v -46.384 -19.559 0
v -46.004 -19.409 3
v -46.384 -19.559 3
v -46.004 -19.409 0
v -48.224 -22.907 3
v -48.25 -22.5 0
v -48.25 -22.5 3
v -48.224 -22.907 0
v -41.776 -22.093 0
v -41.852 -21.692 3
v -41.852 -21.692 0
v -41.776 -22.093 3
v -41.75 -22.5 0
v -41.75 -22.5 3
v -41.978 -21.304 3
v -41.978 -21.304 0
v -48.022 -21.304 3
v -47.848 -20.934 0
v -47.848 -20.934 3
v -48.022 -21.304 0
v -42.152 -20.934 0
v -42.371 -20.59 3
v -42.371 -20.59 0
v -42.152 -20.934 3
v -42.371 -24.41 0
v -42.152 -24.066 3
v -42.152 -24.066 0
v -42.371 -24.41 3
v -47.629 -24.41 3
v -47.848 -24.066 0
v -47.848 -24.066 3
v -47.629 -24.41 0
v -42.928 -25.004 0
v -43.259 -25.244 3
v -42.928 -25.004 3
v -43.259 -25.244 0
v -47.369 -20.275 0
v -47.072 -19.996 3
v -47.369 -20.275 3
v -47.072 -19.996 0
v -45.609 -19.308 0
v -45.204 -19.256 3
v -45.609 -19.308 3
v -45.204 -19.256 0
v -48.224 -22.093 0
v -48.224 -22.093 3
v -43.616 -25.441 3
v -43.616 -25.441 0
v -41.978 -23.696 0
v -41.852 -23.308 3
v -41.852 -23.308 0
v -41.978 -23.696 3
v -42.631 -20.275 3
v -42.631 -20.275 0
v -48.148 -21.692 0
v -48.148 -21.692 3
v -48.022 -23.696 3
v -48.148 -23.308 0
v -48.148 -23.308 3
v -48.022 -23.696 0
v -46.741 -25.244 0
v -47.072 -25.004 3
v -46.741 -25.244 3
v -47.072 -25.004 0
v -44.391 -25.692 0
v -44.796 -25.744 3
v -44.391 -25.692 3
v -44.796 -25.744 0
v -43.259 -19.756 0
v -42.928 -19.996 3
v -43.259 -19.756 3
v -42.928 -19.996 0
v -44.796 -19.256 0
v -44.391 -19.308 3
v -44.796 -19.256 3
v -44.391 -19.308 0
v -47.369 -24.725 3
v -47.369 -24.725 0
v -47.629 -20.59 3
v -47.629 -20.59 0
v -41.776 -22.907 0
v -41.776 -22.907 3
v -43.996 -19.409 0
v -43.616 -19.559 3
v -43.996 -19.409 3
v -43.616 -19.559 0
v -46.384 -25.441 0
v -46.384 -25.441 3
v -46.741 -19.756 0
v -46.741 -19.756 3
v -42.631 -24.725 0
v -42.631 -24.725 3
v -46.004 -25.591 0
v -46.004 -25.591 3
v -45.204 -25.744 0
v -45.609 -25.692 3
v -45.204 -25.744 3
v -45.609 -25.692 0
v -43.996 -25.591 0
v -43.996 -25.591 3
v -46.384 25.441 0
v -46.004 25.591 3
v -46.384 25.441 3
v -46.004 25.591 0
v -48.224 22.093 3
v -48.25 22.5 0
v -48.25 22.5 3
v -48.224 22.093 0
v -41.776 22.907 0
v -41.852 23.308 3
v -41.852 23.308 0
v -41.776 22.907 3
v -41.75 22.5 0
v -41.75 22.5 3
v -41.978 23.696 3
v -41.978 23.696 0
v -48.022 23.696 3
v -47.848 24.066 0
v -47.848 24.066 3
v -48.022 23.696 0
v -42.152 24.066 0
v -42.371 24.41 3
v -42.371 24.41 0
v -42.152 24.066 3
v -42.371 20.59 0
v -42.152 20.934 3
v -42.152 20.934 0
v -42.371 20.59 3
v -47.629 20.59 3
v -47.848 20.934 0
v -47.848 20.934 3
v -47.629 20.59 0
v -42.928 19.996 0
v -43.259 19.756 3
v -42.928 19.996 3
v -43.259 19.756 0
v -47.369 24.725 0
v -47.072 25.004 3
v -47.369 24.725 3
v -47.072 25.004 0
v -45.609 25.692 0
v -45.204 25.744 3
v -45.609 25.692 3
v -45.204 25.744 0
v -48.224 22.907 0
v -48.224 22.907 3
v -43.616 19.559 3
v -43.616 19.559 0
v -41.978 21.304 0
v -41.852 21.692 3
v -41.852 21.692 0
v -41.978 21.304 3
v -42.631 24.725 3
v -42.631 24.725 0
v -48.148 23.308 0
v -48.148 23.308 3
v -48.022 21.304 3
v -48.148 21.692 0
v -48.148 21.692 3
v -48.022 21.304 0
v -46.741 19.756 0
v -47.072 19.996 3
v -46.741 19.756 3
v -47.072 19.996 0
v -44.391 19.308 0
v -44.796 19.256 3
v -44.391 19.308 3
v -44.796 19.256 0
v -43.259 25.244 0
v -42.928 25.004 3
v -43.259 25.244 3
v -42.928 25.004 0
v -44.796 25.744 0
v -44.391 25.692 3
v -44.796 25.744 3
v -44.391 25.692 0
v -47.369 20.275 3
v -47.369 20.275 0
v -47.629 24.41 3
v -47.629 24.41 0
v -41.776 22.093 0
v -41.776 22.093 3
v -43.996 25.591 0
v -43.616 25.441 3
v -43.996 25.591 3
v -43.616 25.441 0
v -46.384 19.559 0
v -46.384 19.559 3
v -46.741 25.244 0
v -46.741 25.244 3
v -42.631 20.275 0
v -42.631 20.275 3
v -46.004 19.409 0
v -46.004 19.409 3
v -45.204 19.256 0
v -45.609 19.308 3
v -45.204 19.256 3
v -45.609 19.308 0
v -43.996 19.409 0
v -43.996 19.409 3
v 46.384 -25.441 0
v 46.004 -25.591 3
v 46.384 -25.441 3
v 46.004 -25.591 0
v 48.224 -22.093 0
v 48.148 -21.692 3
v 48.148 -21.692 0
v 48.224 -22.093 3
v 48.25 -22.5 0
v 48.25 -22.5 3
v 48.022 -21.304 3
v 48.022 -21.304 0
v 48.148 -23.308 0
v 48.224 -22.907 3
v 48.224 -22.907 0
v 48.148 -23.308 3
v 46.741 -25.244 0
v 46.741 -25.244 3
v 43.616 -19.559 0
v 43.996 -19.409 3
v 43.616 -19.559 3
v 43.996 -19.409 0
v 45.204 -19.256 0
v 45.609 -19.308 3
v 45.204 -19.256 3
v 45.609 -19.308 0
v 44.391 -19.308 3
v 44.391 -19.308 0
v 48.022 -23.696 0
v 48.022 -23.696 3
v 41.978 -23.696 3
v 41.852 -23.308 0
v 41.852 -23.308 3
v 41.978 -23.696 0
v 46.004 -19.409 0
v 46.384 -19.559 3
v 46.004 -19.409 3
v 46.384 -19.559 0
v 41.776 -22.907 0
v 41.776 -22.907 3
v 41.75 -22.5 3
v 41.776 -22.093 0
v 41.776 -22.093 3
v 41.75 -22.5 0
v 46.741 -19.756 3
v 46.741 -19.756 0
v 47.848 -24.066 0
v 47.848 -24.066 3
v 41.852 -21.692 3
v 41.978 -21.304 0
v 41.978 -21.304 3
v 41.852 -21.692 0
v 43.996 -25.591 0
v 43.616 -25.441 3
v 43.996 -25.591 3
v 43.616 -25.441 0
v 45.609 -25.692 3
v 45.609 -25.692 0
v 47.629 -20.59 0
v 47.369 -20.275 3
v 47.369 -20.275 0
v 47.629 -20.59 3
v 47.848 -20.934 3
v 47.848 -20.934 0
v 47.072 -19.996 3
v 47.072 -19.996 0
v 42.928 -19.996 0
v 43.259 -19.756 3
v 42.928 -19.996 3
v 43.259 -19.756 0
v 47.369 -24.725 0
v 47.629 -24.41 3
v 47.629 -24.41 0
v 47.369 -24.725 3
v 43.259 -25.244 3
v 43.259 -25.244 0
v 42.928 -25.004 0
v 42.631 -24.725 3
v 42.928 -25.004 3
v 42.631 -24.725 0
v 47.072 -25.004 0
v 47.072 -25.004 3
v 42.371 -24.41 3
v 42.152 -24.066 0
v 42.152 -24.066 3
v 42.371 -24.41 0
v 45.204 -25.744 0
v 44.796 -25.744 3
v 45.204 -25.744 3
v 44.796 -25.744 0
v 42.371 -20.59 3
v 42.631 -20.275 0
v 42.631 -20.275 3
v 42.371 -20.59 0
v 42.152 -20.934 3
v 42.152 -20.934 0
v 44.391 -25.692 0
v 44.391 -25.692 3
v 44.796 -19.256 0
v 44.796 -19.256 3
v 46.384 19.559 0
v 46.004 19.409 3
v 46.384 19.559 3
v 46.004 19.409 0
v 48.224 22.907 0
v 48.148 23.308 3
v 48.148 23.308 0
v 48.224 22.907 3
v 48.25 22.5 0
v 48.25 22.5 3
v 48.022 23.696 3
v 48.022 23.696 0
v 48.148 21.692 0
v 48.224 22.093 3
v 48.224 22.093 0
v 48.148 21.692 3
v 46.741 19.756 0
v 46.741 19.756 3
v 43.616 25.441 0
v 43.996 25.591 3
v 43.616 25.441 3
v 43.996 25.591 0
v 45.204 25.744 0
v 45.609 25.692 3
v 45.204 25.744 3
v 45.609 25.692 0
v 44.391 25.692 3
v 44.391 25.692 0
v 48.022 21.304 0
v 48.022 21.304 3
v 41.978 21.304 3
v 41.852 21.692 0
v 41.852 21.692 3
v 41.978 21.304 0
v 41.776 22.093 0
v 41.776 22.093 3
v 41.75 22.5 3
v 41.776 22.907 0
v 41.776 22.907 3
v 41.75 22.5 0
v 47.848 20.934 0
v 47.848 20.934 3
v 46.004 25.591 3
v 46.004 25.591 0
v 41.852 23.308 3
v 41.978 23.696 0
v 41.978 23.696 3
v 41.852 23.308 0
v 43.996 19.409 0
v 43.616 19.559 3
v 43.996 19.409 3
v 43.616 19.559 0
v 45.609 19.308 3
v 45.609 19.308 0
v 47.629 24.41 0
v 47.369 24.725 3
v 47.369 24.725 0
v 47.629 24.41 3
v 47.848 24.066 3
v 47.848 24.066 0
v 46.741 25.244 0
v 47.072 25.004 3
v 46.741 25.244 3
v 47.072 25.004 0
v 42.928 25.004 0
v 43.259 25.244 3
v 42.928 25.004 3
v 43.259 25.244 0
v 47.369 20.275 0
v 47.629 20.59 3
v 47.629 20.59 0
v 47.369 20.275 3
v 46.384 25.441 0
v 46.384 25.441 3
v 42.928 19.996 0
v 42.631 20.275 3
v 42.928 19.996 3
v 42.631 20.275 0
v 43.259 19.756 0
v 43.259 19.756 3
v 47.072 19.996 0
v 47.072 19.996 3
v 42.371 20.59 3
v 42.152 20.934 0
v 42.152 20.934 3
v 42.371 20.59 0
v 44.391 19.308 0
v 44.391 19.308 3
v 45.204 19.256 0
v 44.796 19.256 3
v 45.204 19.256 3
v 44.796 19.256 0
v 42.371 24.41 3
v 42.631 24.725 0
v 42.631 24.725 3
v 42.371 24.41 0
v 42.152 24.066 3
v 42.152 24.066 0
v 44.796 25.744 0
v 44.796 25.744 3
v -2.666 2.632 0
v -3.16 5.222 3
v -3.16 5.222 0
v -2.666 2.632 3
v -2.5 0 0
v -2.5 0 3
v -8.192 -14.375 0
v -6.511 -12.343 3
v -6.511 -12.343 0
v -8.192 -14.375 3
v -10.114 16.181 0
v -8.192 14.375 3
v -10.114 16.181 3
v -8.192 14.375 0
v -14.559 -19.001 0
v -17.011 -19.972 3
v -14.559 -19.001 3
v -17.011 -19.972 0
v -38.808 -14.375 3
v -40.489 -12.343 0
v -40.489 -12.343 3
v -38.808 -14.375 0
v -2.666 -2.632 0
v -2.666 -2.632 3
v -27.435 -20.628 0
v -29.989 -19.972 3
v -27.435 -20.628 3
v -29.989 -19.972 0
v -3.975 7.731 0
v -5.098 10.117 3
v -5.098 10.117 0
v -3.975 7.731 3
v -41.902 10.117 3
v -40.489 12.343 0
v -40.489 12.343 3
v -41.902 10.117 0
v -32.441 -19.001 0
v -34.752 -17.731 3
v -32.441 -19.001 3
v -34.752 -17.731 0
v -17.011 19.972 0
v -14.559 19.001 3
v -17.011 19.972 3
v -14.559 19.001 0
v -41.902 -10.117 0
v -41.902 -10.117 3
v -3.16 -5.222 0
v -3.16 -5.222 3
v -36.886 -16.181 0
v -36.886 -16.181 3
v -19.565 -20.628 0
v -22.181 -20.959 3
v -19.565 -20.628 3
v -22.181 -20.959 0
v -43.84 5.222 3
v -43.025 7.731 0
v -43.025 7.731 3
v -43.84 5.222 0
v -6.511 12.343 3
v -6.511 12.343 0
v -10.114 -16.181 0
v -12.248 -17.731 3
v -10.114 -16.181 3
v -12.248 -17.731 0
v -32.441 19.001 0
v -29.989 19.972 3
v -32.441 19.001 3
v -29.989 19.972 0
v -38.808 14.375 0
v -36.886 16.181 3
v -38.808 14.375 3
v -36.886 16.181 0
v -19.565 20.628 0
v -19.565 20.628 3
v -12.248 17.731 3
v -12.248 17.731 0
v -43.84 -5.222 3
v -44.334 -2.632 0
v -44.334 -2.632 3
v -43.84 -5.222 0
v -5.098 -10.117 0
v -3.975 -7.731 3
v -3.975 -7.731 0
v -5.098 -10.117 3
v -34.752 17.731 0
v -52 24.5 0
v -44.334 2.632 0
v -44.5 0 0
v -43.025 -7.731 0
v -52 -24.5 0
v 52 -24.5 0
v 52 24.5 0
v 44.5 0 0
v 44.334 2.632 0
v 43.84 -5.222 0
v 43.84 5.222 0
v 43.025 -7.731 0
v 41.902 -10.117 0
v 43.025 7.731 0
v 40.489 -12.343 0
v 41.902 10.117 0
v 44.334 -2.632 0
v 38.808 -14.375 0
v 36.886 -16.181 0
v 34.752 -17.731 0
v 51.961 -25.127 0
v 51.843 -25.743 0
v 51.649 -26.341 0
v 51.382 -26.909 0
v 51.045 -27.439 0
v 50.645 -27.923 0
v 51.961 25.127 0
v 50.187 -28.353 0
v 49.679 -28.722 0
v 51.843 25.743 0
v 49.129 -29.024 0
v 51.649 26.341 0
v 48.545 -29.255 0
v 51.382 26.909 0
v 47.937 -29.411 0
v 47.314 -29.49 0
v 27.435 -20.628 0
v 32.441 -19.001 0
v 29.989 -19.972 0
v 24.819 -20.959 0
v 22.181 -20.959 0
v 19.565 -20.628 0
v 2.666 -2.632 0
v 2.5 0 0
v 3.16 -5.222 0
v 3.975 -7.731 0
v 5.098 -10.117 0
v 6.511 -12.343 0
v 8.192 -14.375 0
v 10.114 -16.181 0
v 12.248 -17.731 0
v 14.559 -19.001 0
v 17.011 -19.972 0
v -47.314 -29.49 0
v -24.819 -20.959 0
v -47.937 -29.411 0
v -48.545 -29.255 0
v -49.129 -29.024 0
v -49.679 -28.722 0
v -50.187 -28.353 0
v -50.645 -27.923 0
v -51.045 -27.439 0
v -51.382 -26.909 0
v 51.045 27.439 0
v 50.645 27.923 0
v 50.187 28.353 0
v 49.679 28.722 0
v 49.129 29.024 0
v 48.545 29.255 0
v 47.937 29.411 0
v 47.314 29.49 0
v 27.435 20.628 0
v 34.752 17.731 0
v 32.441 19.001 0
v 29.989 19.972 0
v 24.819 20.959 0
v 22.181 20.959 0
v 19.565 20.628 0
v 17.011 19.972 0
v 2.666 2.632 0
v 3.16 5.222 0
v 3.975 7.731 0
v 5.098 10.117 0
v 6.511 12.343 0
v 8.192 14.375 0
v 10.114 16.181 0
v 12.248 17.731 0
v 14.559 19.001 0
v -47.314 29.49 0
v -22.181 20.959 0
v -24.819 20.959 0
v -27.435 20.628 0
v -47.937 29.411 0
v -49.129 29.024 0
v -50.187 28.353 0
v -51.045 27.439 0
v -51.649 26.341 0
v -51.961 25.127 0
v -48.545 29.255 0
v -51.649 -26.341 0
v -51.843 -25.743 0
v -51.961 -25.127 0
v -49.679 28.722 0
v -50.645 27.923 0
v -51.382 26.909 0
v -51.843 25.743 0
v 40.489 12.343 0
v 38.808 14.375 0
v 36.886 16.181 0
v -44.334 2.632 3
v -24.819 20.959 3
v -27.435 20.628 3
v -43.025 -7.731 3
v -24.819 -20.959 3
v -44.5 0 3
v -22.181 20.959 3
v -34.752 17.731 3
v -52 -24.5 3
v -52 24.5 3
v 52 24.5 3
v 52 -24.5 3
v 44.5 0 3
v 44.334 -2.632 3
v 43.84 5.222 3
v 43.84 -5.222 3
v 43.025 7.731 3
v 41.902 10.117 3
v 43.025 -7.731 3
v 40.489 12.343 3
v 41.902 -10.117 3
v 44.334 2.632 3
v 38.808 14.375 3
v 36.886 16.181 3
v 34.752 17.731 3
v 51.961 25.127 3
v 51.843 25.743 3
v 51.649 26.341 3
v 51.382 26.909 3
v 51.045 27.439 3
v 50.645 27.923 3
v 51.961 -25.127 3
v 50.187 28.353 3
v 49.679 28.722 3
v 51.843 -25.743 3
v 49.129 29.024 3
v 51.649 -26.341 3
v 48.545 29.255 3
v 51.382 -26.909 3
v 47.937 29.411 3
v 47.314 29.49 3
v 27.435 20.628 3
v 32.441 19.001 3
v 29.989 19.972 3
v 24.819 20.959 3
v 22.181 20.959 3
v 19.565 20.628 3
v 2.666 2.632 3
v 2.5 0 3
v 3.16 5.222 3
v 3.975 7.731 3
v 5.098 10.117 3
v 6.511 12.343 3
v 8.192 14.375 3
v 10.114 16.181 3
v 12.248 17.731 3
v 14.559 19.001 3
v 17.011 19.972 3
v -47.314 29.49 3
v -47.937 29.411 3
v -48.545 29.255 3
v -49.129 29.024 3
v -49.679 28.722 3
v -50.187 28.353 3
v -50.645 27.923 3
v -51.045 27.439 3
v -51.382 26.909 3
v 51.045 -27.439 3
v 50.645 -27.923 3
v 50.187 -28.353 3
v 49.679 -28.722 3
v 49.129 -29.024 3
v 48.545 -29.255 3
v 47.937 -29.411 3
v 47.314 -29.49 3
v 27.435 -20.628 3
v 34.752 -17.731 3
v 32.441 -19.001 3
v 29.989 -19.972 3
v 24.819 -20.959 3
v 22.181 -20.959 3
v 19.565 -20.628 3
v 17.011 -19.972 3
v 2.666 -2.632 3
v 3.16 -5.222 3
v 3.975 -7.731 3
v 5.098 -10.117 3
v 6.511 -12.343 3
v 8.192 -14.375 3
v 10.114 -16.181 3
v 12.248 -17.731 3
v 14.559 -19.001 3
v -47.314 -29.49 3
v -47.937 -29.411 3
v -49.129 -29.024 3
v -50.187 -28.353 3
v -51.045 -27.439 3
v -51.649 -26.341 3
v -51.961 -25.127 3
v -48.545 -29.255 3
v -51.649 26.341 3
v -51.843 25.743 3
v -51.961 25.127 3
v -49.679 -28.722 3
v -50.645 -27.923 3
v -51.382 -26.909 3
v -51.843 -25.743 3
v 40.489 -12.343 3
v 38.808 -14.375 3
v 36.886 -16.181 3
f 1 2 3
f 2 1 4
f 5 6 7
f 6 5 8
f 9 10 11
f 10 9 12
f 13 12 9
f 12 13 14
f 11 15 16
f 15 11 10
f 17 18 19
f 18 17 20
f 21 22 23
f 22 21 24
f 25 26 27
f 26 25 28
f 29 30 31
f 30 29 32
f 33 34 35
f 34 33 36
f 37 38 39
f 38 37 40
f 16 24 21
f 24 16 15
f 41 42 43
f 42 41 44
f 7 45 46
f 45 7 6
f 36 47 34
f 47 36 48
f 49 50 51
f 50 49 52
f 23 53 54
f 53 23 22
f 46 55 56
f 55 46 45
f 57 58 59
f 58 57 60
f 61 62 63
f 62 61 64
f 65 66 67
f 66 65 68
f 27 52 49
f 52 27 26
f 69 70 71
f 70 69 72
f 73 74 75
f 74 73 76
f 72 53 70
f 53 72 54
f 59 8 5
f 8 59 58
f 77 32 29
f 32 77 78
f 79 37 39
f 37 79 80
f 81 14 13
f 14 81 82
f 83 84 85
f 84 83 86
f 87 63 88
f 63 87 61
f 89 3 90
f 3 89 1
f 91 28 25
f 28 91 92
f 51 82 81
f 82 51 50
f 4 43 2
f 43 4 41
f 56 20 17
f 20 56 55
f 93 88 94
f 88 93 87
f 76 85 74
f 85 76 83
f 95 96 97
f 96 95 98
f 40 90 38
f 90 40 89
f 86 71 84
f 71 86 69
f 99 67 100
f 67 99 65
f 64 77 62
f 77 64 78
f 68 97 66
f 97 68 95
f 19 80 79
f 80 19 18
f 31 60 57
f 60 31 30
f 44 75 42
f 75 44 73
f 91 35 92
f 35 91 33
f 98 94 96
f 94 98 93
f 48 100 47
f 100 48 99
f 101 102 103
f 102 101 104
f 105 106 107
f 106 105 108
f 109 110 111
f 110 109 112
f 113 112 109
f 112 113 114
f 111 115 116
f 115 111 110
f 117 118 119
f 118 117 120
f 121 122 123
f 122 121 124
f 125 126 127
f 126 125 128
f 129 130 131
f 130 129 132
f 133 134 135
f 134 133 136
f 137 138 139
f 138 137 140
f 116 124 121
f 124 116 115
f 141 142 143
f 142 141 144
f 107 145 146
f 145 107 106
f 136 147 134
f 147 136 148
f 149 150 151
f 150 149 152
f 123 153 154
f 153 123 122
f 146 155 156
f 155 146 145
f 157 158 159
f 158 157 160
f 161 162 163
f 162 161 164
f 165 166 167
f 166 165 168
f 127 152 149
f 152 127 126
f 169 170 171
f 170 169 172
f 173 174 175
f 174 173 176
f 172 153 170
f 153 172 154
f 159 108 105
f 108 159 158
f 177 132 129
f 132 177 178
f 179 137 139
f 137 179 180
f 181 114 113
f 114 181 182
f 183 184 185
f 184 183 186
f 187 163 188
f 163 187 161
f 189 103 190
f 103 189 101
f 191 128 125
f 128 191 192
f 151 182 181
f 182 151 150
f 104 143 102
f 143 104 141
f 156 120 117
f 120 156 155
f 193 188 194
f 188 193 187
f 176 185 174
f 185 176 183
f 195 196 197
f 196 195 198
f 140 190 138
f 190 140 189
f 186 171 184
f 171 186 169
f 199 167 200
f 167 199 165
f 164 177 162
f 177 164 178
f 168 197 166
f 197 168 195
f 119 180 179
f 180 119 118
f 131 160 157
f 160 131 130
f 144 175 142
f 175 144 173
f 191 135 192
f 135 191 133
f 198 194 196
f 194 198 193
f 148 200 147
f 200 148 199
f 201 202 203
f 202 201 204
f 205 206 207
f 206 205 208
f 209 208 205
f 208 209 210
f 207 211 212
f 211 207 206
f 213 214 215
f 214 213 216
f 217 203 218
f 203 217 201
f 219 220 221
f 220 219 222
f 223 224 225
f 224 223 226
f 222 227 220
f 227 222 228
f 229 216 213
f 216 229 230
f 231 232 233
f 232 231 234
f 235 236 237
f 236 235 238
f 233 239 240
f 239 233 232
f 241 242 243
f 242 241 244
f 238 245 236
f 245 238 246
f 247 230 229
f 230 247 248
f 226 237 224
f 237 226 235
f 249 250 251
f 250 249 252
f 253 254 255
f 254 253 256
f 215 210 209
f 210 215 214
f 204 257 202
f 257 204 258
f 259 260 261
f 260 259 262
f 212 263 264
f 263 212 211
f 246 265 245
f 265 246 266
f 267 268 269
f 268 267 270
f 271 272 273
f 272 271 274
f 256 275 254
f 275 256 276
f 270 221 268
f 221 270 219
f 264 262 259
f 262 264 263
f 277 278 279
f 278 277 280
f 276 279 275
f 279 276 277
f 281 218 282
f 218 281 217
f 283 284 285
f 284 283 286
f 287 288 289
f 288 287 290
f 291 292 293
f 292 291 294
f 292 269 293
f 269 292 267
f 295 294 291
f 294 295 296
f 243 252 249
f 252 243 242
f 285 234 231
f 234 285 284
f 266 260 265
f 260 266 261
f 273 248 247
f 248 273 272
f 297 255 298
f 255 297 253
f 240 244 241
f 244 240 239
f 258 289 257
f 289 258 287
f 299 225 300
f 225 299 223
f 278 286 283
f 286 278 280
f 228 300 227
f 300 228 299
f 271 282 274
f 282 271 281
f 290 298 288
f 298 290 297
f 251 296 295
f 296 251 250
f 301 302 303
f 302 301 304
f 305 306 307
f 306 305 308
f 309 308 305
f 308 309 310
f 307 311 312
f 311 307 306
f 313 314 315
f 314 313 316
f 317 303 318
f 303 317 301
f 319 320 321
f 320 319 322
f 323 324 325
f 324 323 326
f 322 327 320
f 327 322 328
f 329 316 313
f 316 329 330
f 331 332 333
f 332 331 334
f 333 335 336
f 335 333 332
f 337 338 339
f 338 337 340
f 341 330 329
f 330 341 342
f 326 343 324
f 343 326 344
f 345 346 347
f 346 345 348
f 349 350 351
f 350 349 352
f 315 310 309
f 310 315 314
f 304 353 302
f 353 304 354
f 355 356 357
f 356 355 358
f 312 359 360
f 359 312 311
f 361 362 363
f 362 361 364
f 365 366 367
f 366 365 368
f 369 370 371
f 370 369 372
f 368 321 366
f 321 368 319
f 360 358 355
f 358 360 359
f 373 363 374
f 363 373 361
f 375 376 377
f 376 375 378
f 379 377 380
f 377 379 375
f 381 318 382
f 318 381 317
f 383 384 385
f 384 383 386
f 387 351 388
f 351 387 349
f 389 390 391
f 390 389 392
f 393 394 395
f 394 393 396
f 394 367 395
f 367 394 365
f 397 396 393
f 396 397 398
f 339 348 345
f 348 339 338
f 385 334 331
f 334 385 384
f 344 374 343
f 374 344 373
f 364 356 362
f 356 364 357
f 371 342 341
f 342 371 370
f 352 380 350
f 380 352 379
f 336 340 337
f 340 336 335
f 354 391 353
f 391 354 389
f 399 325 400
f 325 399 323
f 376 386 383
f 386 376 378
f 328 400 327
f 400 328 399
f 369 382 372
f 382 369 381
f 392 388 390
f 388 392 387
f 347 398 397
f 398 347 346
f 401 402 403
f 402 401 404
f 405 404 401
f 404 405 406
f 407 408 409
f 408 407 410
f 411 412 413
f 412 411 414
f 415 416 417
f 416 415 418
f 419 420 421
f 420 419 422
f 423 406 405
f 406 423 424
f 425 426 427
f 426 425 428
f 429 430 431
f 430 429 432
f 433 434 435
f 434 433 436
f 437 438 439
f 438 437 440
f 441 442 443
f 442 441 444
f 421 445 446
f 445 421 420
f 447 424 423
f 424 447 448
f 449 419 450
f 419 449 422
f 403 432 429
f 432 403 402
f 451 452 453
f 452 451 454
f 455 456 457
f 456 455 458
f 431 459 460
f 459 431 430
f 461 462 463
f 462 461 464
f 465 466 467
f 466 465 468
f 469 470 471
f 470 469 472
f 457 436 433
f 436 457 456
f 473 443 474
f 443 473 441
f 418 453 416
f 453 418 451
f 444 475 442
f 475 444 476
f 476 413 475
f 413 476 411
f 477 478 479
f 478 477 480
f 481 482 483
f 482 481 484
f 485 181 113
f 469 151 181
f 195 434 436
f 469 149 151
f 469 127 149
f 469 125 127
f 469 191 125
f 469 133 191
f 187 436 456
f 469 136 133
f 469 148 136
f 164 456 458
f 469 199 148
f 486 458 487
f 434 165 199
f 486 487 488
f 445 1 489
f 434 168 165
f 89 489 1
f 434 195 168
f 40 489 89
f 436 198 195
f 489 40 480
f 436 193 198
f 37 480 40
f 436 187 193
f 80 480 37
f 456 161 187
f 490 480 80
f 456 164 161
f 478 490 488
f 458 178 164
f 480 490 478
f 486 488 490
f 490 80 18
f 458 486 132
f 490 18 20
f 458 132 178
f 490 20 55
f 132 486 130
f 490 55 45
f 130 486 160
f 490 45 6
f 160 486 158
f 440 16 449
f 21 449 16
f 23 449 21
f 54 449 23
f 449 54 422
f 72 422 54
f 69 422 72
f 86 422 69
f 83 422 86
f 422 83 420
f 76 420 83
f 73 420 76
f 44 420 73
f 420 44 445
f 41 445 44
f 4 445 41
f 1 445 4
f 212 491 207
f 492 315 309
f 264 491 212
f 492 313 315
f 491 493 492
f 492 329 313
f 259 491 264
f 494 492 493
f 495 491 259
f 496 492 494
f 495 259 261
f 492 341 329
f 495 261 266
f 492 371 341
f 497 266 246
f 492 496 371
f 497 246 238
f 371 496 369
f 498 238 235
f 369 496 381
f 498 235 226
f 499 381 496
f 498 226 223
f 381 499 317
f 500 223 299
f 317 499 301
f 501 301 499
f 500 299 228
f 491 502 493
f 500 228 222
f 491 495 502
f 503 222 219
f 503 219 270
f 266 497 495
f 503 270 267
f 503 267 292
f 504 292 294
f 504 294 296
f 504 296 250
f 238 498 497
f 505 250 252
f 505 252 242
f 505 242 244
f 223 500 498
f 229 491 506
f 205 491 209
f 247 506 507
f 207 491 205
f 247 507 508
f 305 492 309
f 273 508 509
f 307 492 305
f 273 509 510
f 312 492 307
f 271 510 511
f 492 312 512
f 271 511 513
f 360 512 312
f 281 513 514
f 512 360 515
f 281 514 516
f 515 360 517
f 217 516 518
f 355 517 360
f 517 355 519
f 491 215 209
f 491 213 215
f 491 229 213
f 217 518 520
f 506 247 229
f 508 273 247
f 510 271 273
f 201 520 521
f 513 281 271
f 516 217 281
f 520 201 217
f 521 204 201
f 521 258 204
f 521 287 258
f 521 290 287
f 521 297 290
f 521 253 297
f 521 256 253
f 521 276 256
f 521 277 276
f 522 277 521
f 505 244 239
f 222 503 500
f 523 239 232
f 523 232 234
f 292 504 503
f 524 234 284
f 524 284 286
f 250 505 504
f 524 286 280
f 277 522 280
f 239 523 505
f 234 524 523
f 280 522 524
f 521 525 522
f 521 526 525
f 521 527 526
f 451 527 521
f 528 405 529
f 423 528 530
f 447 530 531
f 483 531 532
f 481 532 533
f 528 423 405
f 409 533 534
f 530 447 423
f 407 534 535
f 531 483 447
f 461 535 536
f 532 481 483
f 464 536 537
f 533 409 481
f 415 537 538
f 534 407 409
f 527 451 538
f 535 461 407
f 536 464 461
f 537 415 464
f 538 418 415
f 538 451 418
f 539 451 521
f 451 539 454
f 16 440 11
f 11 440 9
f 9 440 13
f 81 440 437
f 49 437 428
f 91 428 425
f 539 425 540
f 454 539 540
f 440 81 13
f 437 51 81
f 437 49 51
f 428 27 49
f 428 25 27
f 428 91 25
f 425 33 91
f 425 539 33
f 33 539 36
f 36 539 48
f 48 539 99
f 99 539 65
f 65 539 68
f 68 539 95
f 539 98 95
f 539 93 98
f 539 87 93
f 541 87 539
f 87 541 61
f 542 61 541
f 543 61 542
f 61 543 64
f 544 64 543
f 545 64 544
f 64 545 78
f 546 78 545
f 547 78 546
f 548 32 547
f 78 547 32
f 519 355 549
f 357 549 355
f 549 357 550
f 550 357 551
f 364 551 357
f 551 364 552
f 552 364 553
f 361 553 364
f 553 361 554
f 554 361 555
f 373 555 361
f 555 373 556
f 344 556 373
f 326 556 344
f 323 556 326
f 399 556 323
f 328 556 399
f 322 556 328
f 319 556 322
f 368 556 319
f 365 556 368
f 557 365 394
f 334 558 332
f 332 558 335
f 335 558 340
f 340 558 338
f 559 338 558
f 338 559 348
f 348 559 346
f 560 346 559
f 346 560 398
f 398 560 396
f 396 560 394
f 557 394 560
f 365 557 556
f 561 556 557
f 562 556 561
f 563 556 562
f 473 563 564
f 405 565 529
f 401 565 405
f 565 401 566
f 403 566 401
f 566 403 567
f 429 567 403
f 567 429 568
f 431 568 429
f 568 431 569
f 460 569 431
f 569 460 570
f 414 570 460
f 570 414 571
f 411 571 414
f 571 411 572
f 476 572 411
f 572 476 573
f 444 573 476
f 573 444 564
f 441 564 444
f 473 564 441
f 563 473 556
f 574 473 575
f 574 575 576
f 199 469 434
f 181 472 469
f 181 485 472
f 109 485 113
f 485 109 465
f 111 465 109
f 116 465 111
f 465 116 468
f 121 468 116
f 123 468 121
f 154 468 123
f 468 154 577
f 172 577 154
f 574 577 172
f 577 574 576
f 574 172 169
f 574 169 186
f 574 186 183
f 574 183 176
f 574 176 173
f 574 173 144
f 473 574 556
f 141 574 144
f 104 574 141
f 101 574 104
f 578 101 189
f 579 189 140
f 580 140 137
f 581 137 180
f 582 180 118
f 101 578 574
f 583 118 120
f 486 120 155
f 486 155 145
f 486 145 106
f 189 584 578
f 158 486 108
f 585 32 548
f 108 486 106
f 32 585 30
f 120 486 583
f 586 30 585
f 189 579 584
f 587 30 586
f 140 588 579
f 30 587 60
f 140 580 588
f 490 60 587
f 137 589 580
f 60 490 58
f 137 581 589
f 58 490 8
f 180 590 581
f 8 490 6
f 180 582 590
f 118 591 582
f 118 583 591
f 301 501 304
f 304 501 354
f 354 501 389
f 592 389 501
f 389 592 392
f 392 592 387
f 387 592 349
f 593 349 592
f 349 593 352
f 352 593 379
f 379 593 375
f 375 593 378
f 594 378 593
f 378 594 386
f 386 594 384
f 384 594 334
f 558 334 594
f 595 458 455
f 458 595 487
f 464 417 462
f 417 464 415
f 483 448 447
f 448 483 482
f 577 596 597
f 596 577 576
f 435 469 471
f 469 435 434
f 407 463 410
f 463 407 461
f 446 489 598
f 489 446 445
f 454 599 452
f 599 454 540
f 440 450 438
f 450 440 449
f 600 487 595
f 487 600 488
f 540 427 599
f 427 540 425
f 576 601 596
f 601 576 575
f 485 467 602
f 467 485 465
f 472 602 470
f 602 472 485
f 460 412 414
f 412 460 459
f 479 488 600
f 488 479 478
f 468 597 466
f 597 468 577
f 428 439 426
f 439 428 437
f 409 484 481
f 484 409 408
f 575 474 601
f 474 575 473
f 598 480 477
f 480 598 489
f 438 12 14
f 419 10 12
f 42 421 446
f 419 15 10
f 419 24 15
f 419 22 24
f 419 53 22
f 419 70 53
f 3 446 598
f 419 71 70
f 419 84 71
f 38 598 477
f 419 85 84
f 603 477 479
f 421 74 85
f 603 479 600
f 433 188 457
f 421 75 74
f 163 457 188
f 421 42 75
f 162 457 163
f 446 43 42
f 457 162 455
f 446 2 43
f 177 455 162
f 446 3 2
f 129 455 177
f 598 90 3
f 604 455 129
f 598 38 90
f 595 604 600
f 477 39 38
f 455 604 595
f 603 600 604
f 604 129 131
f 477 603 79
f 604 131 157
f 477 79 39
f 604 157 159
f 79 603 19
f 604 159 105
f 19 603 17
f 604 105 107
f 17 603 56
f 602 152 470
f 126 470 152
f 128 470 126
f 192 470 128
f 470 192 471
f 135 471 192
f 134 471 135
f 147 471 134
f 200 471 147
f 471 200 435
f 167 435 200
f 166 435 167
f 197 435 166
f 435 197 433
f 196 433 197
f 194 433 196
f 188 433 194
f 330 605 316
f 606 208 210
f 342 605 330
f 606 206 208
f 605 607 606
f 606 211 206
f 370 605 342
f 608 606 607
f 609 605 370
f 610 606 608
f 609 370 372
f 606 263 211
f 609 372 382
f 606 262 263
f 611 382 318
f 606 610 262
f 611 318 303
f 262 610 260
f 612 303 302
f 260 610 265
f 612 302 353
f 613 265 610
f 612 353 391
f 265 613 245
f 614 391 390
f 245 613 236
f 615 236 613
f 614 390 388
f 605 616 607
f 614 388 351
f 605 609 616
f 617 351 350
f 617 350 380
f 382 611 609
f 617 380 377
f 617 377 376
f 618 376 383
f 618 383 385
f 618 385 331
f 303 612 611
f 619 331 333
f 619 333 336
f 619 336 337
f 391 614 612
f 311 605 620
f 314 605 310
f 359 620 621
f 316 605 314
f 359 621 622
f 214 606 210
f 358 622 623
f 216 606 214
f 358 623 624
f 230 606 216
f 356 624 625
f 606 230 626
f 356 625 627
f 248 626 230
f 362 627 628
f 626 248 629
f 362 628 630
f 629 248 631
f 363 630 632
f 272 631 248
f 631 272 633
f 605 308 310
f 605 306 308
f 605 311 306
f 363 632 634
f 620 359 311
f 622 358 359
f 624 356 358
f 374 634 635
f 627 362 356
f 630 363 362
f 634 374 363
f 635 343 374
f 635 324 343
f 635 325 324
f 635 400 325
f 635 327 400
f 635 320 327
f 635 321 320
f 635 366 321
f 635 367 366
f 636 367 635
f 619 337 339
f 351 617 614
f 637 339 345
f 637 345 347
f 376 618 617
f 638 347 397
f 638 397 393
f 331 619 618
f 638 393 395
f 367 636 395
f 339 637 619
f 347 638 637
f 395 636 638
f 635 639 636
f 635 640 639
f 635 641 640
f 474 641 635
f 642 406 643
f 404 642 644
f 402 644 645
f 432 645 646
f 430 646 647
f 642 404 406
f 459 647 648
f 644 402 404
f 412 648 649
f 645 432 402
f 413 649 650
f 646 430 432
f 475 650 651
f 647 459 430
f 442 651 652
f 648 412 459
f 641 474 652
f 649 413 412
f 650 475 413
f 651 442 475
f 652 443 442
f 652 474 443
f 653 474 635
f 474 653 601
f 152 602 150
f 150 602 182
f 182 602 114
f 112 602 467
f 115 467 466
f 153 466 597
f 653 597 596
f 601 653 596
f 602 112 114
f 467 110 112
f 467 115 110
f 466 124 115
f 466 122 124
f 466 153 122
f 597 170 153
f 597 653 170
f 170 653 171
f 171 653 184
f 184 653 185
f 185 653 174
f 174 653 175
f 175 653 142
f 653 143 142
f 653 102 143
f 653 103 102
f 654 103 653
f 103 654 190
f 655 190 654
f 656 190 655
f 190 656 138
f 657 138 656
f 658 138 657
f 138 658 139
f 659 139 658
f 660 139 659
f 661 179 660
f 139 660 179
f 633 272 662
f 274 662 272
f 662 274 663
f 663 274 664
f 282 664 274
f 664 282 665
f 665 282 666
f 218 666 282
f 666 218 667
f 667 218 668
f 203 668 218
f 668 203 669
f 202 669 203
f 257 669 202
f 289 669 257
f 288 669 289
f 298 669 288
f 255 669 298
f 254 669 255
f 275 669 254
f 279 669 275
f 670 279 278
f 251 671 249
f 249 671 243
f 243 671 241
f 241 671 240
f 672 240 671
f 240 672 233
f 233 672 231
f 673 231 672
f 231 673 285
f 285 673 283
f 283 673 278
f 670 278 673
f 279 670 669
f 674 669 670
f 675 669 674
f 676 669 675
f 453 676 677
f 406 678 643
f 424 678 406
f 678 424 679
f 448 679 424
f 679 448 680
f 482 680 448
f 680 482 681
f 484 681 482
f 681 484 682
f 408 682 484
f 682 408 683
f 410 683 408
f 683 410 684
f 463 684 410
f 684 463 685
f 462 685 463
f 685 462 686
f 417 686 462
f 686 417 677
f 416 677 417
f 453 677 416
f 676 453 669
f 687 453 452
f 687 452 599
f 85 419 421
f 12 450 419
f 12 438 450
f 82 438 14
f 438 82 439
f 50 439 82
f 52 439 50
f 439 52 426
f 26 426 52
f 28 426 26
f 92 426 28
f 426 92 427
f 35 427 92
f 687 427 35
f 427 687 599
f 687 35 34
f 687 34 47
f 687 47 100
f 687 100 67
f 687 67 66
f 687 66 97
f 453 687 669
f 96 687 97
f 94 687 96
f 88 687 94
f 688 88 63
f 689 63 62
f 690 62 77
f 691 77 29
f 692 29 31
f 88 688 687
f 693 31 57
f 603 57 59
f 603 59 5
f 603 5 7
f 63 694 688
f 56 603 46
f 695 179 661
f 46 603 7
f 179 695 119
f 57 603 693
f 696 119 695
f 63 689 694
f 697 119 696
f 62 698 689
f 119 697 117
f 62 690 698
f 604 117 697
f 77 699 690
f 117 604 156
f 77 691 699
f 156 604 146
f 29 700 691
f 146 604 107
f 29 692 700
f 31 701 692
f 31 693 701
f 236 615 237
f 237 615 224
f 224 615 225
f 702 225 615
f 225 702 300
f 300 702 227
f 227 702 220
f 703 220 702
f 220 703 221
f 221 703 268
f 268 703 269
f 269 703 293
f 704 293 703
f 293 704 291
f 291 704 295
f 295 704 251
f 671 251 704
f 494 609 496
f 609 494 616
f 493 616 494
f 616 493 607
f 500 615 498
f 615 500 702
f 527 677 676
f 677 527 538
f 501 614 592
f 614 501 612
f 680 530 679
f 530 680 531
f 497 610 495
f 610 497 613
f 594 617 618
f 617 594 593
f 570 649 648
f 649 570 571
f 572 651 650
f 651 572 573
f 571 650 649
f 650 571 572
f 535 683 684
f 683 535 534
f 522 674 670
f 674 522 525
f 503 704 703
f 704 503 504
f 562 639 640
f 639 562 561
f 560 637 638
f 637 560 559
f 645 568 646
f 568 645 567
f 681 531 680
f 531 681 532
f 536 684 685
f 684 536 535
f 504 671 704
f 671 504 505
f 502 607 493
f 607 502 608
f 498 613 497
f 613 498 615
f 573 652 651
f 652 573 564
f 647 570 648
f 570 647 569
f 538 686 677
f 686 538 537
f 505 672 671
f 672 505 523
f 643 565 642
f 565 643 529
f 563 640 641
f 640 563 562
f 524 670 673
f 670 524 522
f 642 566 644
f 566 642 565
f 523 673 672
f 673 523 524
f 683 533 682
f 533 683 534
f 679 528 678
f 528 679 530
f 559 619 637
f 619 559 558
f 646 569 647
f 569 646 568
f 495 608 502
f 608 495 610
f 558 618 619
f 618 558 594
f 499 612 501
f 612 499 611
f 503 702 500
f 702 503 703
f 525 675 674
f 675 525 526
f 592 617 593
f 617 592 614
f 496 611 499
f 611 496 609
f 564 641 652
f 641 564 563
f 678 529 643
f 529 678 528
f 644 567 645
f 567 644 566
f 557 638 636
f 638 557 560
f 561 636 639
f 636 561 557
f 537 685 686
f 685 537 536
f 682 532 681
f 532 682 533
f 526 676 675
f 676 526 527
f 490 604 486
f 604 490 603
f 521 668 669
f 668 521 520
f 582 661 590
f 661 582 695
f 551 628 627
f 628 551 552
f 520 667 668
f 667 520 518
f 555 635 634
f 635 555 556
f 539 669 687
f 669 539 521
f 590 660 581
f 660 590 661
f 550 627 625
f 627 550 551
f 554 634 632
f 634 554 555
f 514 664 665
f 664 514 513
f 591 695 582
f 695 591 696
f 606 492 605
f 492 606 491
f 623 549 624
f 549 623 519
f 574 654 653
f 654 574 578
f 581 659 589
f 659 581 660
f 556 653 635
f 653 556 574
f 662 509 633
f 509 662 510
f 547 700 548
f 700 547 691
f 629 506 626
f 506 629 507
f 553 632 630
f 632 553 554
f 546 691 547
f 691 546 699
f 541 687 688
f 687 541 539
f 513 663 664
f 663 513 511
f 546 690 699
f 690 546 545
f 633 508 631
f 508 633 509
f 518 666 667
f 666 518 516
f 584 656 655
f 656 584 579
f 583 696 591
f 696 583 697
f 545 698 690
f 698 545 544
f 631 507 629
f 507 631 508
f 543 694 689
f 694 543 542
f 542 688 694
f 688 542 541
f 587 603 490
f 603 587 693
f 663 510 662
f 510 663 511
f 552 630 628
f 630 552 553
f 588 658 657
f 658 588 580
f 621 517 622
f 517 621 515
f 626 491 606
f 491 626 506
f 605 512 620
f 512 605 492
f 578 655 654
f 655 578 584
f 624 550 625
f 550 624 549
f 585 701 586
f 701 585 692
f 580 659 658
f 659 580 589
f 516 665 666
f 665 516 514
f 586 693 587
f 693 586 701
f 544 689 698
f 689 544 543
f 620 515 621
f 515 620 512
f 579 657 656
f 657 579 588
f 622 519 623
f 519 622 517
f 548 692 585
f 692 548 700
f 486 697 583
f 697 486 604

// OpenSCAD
$fn = 50;

difference() {
	union() {
		hull() {
			translate(v = [-47.0, 24.5, 0]) {
				cylinder(h = 3, r = 5);
			}
			translate(v = [47.0, 24.5, 0]) {
				cylinder(h = 3, r = 5);
			}
			translate(v = [-47.0, -24.5, 0]) {
				cylinder(h = 3, r = 5);
			}
			translate(v = [47.0, -24.5, 0]) {
				cylinder(h = 3, r = 5);
			}
		}
	}
	union() {
		translate(v = [-45.0, -22.5, -100.0]) {
			cylinder(h = 200, r = 3.25);
		}
		translate(v = [-45.0, 22.5, -100.0]) {
			cylinder(h = 200, r = 3.25);
		}
		translate(v = [45.0, -22.5, -100.0]) {
			cylinder(h = 200, r = 3.25);
		}
		translate(v = [45.0, 22.5, -100.0]) {
			cylinder(h = 200, r = 3.25);
		}
		translate(v = [-45.0, -22.5, -100.0]) {
			cylinder(h = 200, r = 1.8);
		}
		translate(v = [-45.0, 22.5, -100.0]) {
			cylinder(h = 200, r = 1.8);
		}
		translate(v = [45.0, -22.5, -100.0]) {
			cylinder(h = 200, r = 1.8);
		}
		translate(v = [45.0, 22.5, -100.0]) {
			cylinder(h = 200, r = 1.8);
		}
		translate(v = [-23.5, 0, 0.0]) {
			cylinder(h = 3, r = 21.0);
		}
		translate(v = [23.5, 0, 0.0]) {
			cylinder(h = 3, r = 21.0);
		}
	}
}
